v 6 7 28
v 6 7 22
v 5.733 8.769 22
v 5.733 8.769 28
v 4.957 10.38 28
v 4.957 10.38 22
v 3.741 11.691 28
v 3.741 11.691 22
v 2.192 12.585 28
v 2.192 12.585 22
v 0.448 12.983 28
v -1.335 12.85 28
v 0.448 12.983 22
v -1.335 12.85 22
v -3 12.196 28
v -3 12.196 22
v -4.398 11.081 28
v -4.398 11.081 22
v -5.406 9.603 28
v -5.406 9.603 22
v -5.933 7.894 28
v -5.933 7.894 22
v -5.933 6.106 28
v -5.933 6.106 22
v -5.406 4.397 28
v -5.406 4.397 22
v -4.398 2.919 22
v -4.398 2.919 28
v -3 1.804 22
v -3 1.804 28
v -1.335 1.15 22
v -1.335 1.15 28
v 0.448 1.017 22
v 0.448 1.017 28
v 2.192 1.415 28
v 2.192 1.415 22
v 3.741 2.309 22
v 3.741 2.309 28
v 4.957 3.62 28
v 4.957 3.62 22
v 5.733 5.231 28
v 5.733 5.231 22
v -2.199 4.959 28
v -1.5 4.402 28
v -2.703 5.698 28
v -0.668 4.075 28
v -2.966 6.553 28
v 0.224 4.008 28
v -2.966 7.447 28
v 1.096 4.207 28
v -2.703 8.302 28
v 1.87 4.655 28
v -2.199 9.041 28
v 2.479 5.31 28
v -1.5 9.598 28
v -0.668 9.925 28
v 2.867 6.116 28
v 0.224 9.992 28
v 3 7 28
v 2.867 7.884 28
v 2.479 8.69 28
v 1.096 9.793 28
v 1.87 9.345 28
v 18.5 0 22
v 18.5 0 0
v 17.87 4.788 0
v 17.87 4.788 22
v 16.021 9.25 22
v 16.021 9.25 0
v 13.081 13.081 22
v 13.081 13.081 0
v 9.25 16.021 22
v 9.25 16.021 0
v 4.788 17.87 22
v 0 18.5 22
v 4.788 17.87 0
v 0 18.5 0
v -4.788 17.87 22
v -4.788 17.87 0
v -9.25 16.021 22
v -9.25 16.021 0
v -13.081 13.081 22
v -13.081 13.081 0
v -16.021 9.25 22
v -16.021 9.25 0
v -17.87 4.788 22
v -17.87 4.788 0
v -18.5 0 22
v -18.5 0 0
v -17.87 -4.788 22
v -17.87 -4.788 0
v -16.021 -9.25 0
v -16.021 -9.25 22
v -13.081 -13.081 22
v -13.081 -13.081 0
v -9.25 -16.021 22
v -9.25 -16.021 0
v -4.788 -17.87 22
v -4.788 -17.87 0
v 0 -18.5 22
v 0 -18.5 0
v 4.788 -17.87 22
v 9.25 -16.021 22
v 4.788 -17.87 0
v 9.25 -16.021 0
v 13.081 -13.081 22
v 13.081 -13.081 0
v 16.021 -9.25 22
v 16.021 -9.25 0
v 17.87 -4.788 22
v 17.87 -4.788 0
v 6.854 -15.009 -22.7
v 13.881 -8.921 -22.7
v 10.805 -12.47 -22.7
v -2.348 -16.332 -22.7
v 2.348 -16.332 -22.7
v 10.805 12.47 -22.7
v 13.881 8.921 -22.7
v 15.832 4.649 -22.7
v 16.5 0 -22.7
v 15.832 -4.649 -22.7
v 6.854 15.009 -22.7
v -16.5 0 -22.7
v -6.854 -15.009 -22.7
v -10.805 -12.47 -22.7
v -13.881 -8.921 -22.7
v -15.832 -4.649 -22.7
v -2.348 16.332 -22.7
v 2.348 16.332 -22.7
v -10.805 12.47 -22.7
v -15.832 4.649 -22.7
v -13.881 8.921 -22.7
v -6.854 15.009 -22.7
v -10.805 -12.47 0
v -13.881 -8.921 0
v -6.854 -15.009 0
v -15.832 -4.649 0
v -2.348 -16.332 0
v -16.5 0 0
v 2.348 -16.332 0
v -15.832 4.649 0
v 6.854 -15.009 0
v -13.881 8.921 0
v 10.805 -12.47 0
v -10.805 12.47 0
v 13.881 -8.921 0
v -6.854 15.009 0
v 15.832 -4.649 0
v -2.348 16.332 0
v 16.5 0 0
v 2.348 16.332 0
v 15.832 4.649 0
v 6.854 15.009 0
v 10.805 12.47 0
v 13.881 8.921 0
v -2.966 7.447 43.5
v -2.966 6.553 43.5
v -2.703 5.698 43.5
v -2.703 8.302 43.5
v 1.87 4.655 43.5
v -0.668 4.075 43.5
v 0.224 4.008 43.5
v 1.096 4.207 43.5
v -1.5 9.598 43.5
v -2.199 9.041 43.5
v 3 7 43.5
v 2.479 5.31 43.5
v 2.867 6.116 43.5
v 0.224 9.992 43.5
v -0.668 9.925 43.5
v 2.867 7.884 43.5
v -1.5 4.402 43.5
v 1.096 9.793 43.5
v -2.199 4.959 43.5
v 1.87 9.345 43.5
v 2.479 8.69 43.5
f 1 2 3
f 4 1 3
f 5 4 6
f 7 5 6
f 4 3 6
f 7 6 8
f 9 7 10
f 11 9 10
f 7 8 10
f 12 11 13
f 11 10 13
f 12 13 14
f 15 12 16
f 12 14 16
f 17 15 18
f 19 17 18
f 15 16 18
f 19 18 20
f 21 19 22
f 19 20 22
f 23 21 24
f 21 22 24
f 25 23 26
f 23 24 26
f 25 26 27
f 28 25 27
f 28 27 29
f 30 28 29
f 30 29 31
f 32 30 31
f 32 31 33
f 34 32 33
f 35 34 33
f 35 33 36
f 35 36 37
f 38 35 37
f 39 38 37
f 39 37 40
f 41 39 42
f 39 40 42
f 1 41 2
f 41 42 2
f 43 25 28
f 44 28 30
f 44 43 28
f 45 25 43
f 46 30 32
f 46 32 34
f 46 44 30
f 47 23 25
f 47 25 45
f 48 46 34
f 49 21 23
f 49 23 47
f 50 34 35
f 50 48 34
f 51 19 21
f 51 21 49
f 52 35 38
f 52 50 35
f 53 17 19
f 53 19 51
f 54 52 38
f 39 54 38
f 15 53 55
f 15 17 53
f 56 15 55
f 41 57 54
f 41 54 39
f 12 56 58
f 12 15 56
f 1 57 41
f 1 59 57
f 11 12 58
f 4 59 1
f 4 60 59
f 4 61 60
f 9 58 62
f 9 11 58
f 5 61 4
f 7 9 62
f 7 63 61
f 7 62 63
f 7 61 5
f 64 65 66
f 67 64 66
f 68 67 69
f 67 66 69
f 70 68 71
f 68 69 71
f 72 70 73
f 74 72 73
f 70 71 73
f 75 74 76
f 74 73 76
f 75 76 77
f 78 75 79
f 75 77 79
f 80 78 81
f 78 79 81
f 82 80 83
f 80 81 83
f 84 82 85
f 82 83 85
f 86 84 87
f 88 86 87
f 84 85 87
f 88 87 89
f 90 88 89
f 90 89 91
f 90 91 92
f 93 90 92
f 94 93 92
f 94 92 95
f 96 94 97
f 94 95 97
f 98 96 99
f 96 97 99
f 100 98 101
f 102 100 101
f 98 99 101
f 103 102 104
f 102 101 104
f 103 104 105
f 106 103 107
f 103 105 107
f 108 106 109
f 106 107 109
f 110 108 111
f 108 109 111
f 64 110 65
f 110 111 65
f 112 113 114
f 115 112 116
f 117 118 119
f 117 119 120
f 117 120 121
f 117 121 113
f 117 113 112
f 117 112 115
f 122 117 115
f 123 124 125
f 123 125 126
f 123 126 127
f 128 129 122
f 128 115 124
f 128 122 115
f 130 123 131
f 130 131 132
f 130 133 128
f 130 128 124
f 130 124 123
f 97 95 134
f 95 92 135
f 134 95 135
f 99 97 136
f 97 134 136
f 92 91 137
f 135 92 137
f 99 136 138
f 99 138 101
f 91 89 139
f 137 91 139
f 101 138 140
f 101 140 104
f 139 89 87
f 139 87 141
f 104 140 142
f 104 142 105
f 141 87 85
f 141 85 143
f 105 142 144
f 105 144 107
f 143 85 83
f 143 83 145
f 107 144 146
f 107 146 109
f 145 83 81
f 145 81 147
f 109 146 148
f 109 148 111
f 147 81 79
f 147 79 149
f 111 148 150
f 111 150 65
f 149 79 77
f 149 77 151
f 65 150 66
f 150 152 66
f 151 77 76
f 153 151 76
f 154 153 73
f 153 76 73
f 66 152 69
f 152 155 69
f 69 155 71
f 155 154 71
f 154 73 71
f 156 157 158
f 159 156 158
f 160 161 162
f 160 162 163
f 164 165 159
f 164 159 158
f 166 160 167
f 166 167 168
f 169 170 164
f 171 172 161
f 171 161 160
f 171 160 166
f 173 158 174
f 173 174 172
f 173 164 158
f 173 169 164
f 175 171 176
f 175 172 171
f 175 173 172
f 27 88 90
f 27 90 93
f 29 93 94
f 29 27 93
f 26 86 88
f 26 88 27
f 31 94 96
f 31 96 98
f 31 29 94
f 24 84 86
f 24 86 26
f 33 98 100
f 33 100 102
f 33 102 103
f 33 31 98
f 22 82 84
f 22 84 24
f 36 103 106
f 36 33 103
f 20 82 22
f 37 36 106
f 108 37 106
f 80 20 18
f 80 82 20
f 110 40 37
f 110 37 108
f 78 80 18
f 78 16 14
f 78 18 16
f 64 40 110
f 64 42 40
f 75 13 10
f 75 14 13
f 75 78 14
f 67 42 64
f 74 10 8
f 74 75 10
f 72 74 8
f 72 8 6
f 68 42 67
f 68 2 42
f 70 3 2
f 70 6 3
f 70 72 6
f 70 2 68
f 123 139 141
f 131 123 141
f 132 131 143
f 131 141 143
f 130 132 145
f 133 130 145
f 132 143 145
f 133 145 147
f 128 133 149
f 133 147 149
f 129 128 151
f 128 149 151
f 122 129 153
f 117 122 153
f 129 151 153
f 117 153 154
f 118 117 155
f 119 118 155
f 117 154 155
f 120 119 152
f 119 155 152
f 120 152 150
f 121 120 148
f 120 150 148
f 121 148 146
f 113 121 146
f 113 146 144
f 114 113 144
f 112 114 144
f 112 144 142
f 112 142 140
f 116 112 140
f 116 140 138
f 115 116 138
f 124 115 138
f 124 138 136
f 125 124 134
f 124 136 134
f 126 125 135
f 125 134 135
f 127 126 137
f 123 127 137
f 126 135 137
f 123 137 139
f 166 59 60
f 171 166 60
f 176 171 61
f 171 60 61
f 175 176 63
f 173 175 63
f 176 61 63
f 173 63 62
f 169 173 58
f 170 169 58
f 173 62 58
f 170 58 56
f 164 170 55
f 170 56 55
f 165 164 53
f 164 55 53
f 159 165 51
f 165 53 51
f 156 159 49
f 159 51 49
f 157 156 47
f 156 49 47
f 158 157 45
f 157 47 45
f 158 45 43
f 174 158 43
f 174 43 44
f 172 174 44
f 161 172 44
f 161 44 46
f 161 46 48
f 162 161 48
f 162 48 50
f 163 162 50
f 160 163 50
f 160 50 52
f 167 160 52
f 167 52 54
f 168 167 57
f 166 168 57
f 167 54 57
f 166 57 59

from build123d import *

# Parameters (mm, degrees)
SKETCH1_R           = 18.5
BOSS_EXTRUDE1_DEPTH = 22
SKETCH2_R           = 6
BOSS_EXTRUDE2_DEPTH = 6
SKETCH3_R           = 3
BOSS_EXTRUDE3_DEPTH = 15.5
SKETCH4_R           = 16.5
BOSS_EXTRUDE4_DEPTH = 22.7


with BuildPart() as part:
    # Sketch1 → Boss-Extrude1 (new body)
    with BuildSketch(Plane.XY):
        Circle(SKETCH1_R)
    extrude(amount=BOSS_EXTRUDE1_DEPTH)

    # Sketch2 → Boss-Extrude2 (add)
    with BuildSketch(Plane.XY.offset(22)):
        with Locations((0, 7)):
            Circle(SKETCH2_R)
    extrude(amount=BOSS_EXTRUDE2_DEPTH)

    # Sketch3 → Boss-Extrude3 (add)
    with BuildSketch(Plane.XY.offset(28)):
        with Locations((0, 7)):
            Circle(SKETCH3_R)
    extrude(amount=BOSS_EXTRUDE3_DEPTH)

    # Sketch4 → Boss-Extrude4 (add)
    with BuildSketch(Plane(origin=(0, 0, 0), x_dir=(-1, 0, 0), z_dir=(0, 0, -1))):
        Circle(SKETCH4_R)
    extrude(amount=BOSS_EXTRUDE4_DEPTH)


solid = part.part
